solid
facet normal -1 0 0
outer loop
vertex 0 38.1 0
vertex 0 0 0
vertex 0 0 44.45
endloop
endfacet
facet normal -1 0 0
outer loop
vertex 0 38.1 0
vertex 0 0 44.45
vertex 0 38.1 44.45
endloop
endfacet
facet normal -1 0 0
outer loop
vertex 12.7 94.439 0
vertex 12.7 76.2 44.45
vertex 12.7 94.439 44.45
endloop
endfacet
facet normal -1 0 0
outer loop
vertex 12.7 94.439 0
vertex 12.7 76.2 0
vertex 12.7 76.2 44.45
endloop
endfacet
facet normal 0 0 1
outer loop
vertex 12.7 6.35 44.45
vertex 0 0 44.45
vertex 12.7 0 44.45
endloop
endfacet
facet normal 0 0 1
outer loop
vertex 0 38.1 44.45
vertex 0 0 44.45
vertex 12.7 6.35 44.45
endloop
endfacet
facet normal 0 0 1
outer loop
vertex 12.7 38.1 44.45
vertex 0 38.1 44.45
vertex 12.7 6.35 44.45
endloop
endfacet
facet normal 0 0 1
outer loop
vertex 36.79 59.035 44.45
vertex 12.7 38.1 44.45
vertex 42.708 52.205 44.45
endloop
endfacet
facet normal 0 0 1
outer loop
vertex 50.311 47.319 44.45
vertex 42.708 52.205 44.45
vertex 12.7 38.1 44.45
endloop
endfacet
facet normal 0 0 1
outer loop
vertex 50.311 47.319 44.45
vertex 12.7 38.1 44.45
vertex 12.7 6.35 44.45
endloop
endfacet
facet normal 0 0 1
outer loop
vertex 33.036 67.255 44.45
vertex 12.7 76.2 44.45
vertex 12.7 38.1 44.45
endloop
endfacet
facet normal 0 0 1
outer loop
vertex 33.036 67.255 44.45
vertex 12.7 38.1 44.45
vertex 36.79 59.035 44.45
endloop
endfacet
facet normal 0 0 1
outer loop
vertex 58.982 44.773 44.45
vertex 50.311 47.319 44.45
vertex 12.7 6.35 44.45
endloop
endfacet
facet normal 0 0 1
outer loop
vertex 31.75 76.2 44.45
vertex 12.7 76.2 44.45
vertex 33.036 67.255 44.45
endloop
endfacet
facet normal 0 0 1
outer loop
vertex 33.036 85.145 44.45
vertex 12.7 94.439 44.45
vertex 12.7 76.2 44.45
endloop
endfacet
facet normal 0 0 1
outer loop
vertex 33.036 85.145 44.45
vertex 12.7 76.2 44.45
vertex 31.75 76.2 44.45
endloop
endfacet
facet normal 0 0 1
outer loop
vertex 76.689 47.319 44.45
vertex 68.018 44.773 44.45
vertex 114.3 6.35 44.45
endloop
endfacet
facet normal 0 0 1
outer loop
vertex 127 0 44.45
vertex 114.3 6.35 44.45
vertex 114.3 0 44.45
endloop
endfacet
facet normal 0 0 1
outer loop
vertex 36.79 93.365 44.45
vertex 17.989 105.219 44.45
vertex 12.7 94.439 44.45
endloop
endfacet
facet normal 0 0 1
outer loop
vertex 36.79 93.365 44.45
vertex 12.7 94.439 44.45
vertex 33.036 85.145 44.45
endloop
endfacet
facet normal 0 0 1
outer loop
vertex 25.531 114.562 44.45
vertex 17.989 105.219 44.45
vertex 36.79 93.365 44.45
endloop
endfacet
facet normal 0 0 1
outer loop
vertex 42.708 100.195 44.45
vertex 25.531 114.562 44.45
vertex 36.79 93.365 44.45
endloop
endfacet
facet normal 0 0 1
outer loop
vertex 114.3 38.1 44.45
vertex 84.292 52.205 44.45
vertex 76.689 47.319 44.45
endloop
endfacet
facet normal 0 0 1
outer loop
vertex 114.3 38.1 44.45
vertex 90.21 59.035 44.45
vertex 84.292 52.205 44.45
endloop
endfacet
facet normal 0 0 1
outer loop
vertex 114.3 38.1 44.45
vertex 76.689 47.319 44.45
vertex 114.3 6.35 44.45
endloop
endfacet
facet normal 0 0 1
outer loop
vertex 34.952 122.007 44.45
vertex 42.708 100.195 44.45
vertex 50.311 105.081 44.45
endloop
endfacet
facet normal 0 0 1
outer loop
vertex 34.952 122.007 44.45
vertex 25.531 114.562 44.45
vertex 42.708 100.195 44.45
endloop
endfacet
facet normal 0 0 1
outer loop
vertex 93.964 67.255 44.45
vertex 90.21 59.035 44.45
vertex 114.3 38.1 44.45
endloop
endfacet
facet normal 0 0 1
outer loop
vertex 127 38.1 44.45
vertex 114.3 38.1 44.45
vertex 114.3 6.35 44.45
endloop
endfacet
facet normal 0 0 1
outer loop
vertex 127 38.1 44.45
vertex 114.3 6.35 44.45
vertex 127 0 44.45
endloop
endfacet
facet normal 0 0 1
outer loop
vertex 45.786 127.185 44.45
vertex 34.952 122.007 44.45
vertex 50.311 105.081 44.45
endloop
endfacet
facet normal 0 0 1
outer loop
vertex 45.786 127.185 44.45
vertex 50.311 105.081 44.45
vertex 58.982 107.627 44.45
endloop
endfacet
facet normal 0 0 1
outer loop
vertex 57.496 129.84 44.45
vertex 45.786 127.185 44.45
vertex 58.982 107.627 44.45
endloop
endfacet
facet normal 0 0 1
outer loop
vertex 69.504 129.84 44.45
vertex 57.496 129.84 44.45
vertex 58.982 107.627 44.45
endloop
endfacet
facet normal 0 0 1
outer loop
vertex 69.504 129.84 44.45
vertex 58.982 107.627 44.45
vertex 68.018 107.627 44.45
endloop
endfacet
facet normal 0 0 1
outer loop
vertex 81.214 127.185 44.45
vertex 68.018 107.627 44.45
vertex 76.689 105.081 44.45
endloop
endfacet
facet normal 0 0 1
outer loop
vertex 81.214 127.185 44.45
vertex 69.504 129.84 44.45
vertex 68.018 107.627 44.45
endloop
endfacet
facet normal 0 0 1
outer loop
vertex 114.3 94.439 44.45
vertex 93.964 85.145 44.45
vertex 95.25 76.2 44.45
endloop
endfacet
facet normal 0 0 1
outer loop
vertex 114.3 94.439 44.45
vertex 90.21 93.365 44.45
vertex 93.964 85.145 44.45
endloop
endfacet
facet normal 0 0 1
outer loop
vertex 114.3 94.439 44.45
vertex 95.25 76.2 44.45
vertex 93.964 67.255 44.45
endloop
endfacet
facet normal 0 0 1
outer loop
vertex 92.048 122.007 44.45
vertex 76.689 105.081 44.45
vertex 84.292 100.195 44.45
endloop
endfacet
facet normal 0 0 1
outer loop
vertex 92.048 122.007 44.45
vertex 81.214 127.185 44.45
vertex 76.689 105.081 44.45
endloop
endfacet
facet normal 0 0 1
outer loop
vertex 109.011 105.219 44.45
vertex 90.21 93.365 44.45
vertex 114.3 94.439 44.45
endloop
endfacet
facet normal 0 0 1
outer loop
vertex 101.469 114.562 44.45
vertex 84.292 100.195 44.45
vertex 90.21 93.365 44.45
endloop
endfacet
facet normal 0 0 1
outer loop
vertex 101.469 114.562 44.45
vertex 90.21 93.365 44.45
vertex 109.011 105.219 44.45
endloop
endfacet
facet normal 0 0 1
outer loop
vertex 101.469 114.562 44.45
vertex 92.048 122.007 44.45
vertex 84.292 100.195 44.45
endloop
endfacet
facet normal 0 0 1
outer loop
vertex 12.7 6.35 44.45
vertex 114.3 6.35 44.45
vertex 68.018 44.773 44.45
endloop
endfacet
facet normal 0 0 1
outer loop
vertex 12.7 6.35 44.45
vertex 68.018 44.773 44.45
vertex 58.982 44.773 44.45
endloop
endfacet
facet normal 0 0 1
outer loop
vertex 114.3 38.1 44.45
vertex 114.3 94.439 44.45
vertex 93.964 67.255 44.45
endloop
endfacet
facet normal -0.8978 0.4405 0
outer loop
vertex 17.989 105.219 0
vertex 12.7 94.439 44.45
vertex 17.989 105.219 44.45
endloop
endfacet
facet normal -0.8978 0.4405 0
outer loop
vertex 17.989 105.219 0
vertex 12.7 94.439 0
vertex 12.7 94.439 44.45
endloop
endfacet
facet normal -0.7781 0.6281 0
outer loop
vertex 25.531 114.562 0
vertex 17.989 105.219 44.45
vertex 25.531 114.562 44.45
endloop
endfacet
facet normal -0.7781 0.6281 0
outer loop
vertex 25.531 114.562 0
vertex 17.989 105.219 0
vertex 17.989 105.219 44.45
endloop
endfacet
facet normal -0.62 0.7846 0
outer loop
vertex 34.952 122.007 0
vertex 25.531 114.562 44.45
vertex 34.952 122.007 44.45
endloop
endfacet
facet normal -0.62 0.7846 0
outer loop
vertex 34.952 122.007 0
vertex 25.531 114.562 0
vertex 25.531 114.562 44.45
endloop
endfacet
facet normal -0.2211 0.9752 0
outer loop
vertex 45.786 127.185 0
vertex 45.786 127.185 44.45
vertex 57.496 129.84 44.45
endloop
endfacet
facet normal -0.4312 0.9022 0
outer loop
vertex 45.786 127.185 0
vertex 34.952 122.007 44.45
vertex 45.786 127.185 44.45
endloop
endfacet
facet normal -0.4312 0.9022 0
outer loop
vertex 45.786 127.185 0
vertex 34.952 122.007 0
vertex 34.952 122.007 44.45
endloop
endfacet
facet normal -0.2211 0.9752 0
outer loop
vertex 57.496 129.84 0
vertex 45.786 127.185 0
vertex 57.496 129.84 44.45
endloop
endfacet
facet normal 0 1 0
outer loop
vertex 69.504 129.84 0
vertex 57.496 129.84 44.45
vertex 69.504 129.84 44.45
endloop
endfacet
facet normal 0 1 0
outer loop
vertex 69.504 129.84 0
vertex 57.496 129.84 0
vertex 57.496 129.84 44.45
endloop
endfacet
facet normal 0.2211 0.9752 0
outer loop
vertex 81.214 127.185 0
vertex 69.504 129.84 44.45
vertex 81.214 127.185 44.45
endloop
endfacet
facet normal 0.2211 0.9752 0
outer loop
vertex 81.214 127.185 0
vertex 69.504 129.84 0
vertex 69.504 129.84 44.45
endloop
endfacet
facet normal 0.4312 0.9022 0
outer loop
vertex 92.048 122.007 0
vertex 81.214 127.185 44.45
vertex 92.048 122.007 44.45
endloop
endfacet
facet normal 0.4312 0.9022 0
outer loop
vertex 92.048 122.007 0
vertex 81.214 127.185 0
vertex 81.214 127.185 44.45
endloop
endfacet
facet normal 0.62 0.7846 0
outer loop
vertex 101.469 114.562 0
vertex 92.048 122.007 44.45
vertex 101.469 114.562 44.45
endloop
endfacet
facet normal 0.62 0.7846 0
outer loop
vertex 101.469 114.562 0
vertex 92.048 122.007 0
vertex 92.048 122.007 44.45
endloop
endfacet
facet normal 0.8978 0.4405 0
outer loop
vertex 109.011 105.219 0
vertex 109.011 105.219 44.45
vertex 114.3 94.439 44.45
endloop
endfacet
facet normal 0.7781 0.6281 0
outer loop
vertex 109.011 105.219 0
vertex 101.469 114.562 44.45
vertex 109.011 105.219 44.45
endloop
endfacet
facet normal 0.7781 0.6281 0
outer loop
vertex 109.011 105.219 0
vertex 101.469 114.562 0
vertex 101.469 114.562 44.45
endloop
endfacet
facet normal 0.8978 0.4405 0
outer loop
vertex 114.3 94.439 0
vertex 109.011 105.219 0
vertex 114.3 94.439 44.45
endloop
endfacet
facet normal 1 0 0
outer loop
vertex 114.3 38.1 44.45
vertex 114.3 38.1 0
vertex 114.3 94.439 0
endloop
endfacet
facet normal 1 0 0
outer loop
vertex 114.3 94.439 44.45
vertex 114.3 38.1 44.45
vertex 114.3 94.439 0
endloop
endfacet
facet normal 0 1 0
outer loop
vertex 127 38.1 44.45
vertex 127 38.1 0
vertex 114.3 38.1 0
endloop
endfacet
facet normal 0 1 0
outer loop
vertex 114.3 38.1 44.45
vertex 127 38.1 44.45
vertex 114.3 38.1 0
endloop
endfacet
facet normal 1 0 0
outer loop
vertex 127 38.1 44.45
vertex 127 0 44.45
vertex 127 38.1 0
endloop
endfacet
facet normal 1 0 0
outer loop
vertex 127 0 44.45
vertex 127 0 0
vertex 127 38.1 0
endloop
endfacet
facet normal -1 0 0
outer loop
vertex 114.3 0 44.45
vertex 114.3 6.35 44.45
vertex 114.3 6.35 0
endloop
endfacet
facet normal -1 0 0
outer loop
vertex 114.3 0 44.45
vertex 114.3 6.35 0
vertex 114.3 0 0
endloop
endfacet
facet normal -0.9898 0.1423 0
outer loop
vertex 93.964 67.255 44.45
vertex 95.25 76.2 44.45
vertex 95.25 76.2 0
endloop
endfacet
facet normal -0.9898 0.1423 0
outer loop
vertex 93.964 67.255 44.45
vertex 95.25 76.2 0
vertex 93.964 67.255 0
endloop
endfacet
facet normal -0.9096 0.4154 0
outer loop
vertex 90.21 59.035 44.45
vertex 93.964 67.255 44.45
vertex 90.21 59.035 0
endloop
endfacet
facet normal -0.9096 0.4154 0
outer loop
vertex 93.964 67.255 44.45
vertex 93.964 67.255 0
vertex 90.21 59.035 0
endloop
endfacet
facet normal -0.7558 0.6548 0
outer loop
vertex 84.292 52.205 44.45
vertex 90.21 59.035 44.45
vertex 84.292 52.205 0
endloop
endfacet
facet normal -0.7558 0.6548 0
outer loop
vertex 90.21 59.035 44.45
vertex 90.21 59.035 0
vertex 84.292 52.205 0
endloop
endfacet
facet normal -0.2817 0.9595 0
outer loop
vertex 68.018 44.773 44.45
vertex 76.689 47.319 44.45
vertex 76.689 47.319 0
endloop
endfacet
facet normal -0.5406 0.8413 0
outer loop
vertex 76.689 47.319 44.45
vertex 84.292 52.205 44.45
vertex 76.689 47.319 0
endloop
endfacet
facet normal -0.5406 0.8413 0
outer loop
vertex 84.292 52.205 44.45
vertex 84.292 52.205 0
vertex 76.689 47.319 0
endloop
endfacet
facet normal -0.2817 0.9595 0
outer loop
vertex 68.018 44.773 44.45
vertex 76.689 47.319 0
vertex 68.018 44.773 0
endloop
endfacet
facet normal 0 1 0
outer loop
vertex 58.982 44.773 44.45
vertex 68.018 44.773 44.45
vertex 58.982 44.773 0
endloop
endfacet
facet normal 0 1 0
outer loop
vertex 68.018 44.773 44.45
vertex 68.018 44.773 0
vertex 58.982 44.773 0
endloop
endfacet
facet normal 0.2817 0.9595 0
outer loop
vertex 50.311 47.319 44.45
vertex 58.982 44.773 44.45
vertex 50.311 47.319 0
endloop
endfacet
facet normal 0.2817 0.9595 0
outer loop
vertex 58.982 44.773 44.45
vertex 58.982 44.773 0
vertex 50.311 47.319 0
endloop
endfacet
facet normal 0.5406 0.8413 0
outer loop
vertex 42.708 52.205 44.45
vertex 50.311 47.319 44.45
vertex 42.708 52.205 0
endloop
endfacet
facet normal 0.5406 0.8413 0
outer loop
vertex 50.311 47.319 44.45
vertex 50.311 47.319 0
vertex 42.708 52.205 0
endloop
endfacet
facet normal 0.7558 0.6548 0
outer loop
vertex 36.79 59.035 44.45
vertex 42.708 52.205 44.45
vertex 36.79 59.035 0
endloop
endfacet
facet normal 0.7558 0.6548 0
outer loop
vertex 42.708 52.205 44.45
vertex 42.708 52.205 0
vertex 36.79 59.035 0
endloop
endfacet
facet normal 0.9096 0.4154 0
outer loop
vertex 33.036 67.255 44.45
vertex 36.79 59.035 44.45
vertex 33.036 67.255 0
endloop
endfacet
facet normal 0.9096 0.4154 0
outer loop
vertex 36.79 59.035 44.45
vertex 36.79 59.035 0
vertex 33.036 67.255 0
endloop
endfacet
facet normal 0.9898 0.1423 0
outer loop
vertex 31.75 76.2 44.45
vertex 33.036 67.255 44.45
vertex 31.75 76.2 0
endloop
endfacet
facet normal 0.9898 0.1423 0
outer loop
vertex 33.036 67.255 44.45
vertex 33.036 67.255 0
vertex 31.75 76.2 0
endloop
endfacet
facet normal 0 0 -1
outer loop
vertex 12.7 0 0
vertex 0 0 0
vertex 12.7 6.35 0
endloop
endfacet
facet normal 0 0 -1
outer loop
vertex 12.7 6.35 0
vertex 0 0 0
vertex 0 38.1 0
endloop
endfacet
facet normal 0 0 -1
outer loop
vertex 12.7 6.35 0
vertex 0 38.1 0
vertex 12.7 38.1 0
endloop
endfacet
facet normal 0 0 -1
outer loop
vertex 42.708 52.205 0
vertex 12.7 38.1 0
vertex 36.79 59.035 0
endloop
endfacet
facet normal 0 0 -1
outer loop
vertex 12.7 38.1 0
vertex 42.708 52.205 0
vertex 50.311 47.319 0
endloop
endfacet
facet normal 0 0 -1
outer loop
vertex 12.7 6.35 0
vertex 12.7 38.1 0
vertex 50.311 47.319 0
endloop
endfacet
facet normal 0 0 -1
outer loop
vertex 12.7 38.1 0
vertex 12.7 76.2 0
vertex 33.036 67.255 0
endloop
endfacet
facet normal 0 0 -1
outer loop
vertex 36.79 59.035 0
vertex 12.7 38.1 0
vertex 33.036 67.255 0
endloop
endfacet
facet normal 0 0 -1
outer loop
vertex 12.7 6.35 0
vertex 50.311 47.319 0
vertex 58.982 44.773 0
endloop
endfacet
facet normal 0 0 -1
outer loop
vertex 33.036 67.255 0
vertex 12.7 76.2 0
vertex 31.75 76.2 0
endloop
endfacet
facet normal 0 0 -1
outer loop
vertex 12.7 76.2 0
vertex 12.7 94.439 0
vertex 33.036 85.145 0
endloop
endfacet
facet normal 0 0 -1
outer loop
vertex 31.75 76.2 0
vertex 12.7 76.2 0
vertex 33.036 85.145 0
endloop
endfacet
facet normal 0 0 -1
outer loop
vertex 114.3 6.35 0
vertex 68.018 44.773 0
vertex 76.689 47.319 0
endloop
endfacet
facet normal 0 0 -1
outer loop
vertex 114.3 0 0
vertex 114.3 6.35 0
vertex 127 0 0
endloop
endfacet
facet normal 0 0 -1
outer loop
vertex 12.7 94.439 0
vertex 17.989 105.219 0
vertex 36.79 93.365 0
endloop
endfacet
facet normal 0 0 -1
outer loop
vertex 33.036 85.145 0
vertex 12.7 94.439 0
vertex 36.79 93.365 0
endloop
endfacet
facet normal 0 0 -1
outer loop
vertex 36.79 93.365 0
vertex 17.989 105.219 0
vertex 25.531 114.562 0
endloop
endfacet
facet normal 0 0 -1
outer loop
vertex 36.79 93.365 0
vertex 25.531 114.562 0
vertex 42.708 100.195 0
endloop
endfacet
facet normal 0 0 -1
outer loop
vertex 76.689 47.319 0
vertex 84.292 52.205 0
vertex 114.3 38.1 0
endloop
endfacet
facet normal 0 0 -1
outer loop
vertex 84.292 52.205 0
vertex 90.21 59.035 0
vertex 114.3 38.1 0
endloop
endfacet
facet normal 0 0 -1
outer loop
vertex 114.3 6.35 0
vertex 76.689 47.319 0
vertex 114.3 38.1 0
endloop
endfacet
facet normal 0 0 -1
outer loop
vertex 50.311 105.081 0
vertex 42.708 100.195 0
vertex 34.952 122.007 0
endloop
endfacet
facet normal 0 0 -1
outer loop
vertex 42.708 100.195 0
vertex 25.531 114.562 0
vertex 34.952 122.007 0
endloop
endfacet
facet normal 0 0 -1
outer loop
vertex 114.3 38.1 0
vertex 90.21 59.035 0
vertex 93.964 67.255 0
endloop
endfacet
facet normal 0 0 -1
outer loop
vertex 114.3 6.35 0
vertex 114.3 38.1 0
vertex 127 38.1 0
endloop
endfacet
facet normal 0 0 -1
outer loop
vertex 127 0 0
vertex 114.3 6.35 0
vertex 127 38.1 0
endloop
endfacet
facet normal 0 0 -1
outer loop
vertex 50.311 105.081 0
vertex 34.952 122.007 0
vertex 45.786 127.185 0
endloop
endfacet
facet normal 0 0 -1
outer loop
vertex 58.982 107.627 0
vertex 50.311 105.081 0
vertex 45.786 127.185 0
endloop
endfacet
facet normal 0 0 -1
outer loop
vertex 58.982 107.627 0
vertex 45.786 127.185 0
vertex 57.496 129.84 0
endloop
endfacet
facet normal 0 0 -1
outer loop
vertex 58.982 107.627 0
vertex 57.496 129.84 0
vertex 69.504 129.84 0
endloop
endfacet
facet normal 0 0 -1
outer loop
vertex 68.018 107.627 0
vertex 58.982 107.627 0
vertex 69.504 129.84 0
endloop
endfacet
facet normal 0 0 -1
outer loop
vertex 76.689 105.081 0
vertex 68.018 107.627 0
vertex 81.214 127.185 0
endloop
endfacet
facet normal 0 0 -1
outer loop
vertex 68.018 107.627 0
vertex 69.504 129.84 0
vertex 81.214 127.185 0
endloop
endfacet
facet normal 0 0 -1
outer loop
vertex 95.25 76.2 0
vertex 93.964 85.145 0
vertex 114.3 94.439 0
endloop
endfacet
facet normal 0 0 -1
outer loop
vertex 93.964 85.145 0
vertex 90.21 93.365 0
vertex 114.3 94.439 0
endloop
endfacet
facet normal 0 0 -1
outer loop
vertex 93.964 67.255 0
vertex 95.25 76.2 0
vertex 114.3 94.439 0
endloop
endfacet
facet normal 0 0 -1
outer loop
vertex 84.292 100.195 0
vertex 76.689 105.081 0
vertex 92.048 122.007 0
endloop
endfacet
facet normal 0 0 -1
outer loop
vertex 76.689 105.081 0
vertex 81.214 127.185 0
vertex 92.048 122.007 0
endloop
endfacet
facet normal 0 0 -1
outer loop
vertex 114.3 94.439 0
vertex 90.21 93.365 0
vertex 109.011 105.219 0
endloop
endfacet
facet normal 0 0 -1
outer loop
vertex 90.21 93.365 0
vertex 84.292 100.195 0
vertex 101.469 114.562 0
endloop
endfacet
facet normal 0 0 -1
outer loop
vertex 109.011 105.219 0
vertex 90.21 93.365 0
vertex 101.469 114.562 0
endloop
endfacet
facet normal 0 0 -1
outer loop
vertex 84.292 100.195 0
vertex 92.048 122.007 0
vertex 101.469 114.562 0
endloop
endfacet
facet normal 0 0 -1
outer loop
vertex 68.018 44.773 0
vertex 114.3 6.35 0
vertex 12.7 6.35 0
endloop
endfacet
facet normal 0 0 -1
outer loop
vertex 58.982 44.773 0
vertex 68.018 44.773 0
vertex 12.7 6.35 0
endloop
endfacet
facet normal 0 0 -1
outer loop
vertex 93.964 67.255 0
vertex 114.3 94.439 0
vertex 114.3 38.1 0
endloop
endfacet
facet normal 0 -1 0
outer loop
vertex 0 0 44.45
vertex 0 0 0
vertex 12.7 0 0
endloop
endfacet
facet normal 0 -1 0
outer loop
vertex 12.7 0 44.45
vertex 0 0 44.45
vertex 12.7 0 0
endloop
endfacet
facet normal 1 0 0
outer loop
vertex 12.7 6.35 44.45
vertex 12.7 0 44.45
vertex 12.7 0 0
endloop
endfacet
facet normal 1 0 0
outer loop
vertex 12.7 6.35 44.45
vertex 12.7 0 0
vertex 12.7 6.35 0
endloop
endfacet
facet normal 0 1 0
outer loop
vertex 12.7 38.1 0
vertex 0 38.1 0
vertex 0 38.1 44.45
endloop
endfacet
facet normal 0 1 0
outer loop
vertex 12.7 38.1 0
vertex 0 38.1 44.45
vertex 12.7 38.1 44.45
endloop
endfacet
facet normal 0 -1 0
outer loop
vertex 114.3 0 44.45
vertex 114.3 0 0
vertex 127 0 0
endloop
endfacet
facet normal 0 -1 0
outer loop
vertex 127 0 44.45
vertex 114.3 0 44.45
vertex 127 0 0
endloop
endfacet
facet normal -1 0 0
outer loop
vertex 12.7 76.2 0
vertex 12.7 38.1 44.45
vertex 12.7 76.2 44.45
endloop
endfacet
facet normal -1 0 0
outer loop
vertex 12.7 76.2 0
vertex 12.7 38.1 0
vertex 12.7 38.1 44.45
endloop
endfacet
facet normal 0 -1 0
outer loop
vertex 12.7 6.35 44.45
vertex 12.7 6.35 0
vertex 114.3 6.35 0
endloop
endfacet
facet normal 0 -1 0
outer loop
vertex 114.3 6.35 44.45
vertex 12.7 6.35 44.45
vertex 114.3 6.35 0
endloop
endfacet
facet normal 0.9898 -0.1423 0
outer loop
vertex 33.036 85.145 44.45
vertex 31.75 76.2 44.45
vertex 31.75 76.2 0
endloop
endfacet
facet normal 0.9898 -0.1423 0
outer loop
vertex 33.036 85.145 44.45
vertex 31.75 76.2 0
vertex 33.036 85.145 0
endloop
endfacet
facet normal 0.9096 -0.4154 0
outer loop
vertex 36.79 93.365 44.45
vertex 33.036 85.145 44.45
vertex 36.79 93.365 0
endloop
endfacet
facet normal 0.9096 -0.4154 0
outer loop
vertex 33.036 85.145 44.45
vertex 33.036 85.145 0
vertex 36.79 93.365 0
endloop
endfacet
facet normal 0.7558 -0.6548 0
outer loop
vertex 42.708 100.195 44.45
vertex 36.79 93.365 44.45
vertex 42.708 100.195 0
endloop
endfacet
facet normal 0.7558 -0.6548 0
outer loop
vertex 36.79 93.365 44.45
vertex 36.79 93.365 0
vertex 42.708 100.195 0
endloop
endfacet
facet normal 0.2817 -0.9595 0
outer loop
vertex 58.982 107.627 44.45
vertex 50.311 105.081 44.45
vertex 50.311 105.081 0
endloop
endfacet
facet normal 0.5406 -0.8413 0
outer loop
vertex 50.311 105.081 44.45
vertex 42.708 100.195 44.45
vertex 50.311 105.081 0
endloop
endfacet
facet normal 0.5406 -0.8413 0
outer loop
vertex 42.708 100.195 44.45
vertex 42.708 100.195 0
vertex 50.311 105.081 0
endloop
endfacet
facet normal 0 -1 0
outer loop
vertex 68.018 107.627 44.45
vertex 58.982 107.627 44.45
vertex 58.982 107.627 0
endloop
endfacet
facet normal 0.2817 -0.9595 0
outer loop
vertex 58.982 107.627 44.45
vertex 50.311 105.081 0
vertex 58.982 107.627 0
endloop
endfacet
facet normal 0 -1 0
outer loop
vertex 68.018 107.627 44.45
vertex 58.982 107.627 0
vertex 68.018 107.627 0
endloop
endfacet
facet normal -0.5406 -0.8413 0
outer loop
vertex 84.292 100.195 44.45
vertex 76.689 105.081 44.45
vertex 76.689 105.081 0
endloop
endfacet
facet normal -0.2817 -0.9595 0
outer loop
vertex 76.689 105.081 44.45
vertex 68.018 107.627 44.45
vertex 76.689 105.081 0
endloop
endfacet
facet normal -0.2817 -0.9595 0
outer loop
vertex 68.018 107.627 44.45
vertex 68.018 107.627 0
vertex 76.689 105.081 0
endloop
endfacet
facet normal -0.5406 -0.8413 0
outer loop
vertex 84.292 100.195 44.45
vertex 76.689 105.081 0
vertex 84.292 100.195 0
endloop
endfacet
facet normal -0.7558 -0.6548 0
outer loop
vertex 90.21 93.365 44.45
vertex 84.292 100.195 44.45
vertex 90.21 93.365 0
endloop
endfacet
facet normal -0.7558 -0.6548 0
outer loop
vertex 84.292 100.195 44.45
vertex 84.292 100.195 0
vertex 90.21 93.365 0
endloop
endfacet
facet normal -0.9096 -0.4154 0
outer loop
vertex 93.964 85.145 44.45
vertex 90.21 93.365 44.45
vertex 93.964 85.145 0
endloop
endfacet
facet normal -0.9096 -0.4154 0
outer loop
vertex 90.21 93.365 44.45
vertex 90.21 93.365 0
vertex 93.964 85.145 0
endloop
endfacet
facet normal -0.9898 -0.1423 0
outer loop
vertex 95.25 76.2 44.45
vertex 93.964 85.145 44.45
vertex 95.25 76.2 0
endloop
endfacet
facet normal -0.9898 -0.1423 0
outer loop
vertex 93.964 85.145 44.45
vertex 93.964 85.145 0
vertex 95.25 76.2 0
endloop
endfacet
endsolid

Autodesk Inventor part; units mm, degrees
ref_plane "YZ Plane" through (0, 0, 0) normal (1, 0, 0) x (0, 1, 0)
ref_plane "XZ Plane" through (0, 0, 0) normal (0, 1, 0) x (-1, 0, 0)
ref_plane "XY Plane" through (0, 0, 0) normal (0, 0, 1) x (1, 0, 0)
sketch "Sketch1" plane through (0, 0, 0) normal (0, 0, 1) x (1, 0, 0)
  line L0 (0, 0) -> (12.7, 0)
  line L1 (12.7, 0) -> (12.7, 6.35)
  line L2 (12.7, 6.35) -> (114.3, 6.35)
  line L3 (114.3, 6.35) -> (114.3, 0)
  line L4 (114.3, 0) -> (127, 0)
  line L5 (127, 0) -> (127, 38.1)
  line L6 (127, 38.1) -> (114.3, 38.1)
  line L7 (0, 38.1) -> (12.7, 38.1)
  line L8 (0, 0) -> (0, 76.2)
  line L9 (0, 76.2) -> (63.5, 76.2)
  circle A0 centre (63.5, 76.2) radius 31.75
  arc A1 (114.3, 94.439) -> (12.7, 94.439) centre (63.5, 76.2) ccw
  line L10 (12.7, 38.1) -> (12.7, 94.439)
  line L11 (114.3, 38.1) -> (114.3, 94.439)
  dimension "d0" = 12.7
  dimension "d1" = 6.35
  dimension "d2" = 101.6
  dimension "d3" = 6.35
  dimension "d4" = 12.7
  dimension "d5" = 38.1
  dimension "d6" = 12.7
  dimension "d7" = 38.1
  dimension "d8" = 12.7
  dimension "d9" = 76.2
  dimension "d10" = 63.5
  dimension "d11" = 63.5
  dimension "d12" = 107.95
extrude "Extrusion1" add sketch "Sketch1" along normal blind 44.45 contours L8 L7 L10 A1 L11 L6 L5 L4 L3 L2 L1 L0
properties part number "Assignment 2.5 - Guide Silder"
